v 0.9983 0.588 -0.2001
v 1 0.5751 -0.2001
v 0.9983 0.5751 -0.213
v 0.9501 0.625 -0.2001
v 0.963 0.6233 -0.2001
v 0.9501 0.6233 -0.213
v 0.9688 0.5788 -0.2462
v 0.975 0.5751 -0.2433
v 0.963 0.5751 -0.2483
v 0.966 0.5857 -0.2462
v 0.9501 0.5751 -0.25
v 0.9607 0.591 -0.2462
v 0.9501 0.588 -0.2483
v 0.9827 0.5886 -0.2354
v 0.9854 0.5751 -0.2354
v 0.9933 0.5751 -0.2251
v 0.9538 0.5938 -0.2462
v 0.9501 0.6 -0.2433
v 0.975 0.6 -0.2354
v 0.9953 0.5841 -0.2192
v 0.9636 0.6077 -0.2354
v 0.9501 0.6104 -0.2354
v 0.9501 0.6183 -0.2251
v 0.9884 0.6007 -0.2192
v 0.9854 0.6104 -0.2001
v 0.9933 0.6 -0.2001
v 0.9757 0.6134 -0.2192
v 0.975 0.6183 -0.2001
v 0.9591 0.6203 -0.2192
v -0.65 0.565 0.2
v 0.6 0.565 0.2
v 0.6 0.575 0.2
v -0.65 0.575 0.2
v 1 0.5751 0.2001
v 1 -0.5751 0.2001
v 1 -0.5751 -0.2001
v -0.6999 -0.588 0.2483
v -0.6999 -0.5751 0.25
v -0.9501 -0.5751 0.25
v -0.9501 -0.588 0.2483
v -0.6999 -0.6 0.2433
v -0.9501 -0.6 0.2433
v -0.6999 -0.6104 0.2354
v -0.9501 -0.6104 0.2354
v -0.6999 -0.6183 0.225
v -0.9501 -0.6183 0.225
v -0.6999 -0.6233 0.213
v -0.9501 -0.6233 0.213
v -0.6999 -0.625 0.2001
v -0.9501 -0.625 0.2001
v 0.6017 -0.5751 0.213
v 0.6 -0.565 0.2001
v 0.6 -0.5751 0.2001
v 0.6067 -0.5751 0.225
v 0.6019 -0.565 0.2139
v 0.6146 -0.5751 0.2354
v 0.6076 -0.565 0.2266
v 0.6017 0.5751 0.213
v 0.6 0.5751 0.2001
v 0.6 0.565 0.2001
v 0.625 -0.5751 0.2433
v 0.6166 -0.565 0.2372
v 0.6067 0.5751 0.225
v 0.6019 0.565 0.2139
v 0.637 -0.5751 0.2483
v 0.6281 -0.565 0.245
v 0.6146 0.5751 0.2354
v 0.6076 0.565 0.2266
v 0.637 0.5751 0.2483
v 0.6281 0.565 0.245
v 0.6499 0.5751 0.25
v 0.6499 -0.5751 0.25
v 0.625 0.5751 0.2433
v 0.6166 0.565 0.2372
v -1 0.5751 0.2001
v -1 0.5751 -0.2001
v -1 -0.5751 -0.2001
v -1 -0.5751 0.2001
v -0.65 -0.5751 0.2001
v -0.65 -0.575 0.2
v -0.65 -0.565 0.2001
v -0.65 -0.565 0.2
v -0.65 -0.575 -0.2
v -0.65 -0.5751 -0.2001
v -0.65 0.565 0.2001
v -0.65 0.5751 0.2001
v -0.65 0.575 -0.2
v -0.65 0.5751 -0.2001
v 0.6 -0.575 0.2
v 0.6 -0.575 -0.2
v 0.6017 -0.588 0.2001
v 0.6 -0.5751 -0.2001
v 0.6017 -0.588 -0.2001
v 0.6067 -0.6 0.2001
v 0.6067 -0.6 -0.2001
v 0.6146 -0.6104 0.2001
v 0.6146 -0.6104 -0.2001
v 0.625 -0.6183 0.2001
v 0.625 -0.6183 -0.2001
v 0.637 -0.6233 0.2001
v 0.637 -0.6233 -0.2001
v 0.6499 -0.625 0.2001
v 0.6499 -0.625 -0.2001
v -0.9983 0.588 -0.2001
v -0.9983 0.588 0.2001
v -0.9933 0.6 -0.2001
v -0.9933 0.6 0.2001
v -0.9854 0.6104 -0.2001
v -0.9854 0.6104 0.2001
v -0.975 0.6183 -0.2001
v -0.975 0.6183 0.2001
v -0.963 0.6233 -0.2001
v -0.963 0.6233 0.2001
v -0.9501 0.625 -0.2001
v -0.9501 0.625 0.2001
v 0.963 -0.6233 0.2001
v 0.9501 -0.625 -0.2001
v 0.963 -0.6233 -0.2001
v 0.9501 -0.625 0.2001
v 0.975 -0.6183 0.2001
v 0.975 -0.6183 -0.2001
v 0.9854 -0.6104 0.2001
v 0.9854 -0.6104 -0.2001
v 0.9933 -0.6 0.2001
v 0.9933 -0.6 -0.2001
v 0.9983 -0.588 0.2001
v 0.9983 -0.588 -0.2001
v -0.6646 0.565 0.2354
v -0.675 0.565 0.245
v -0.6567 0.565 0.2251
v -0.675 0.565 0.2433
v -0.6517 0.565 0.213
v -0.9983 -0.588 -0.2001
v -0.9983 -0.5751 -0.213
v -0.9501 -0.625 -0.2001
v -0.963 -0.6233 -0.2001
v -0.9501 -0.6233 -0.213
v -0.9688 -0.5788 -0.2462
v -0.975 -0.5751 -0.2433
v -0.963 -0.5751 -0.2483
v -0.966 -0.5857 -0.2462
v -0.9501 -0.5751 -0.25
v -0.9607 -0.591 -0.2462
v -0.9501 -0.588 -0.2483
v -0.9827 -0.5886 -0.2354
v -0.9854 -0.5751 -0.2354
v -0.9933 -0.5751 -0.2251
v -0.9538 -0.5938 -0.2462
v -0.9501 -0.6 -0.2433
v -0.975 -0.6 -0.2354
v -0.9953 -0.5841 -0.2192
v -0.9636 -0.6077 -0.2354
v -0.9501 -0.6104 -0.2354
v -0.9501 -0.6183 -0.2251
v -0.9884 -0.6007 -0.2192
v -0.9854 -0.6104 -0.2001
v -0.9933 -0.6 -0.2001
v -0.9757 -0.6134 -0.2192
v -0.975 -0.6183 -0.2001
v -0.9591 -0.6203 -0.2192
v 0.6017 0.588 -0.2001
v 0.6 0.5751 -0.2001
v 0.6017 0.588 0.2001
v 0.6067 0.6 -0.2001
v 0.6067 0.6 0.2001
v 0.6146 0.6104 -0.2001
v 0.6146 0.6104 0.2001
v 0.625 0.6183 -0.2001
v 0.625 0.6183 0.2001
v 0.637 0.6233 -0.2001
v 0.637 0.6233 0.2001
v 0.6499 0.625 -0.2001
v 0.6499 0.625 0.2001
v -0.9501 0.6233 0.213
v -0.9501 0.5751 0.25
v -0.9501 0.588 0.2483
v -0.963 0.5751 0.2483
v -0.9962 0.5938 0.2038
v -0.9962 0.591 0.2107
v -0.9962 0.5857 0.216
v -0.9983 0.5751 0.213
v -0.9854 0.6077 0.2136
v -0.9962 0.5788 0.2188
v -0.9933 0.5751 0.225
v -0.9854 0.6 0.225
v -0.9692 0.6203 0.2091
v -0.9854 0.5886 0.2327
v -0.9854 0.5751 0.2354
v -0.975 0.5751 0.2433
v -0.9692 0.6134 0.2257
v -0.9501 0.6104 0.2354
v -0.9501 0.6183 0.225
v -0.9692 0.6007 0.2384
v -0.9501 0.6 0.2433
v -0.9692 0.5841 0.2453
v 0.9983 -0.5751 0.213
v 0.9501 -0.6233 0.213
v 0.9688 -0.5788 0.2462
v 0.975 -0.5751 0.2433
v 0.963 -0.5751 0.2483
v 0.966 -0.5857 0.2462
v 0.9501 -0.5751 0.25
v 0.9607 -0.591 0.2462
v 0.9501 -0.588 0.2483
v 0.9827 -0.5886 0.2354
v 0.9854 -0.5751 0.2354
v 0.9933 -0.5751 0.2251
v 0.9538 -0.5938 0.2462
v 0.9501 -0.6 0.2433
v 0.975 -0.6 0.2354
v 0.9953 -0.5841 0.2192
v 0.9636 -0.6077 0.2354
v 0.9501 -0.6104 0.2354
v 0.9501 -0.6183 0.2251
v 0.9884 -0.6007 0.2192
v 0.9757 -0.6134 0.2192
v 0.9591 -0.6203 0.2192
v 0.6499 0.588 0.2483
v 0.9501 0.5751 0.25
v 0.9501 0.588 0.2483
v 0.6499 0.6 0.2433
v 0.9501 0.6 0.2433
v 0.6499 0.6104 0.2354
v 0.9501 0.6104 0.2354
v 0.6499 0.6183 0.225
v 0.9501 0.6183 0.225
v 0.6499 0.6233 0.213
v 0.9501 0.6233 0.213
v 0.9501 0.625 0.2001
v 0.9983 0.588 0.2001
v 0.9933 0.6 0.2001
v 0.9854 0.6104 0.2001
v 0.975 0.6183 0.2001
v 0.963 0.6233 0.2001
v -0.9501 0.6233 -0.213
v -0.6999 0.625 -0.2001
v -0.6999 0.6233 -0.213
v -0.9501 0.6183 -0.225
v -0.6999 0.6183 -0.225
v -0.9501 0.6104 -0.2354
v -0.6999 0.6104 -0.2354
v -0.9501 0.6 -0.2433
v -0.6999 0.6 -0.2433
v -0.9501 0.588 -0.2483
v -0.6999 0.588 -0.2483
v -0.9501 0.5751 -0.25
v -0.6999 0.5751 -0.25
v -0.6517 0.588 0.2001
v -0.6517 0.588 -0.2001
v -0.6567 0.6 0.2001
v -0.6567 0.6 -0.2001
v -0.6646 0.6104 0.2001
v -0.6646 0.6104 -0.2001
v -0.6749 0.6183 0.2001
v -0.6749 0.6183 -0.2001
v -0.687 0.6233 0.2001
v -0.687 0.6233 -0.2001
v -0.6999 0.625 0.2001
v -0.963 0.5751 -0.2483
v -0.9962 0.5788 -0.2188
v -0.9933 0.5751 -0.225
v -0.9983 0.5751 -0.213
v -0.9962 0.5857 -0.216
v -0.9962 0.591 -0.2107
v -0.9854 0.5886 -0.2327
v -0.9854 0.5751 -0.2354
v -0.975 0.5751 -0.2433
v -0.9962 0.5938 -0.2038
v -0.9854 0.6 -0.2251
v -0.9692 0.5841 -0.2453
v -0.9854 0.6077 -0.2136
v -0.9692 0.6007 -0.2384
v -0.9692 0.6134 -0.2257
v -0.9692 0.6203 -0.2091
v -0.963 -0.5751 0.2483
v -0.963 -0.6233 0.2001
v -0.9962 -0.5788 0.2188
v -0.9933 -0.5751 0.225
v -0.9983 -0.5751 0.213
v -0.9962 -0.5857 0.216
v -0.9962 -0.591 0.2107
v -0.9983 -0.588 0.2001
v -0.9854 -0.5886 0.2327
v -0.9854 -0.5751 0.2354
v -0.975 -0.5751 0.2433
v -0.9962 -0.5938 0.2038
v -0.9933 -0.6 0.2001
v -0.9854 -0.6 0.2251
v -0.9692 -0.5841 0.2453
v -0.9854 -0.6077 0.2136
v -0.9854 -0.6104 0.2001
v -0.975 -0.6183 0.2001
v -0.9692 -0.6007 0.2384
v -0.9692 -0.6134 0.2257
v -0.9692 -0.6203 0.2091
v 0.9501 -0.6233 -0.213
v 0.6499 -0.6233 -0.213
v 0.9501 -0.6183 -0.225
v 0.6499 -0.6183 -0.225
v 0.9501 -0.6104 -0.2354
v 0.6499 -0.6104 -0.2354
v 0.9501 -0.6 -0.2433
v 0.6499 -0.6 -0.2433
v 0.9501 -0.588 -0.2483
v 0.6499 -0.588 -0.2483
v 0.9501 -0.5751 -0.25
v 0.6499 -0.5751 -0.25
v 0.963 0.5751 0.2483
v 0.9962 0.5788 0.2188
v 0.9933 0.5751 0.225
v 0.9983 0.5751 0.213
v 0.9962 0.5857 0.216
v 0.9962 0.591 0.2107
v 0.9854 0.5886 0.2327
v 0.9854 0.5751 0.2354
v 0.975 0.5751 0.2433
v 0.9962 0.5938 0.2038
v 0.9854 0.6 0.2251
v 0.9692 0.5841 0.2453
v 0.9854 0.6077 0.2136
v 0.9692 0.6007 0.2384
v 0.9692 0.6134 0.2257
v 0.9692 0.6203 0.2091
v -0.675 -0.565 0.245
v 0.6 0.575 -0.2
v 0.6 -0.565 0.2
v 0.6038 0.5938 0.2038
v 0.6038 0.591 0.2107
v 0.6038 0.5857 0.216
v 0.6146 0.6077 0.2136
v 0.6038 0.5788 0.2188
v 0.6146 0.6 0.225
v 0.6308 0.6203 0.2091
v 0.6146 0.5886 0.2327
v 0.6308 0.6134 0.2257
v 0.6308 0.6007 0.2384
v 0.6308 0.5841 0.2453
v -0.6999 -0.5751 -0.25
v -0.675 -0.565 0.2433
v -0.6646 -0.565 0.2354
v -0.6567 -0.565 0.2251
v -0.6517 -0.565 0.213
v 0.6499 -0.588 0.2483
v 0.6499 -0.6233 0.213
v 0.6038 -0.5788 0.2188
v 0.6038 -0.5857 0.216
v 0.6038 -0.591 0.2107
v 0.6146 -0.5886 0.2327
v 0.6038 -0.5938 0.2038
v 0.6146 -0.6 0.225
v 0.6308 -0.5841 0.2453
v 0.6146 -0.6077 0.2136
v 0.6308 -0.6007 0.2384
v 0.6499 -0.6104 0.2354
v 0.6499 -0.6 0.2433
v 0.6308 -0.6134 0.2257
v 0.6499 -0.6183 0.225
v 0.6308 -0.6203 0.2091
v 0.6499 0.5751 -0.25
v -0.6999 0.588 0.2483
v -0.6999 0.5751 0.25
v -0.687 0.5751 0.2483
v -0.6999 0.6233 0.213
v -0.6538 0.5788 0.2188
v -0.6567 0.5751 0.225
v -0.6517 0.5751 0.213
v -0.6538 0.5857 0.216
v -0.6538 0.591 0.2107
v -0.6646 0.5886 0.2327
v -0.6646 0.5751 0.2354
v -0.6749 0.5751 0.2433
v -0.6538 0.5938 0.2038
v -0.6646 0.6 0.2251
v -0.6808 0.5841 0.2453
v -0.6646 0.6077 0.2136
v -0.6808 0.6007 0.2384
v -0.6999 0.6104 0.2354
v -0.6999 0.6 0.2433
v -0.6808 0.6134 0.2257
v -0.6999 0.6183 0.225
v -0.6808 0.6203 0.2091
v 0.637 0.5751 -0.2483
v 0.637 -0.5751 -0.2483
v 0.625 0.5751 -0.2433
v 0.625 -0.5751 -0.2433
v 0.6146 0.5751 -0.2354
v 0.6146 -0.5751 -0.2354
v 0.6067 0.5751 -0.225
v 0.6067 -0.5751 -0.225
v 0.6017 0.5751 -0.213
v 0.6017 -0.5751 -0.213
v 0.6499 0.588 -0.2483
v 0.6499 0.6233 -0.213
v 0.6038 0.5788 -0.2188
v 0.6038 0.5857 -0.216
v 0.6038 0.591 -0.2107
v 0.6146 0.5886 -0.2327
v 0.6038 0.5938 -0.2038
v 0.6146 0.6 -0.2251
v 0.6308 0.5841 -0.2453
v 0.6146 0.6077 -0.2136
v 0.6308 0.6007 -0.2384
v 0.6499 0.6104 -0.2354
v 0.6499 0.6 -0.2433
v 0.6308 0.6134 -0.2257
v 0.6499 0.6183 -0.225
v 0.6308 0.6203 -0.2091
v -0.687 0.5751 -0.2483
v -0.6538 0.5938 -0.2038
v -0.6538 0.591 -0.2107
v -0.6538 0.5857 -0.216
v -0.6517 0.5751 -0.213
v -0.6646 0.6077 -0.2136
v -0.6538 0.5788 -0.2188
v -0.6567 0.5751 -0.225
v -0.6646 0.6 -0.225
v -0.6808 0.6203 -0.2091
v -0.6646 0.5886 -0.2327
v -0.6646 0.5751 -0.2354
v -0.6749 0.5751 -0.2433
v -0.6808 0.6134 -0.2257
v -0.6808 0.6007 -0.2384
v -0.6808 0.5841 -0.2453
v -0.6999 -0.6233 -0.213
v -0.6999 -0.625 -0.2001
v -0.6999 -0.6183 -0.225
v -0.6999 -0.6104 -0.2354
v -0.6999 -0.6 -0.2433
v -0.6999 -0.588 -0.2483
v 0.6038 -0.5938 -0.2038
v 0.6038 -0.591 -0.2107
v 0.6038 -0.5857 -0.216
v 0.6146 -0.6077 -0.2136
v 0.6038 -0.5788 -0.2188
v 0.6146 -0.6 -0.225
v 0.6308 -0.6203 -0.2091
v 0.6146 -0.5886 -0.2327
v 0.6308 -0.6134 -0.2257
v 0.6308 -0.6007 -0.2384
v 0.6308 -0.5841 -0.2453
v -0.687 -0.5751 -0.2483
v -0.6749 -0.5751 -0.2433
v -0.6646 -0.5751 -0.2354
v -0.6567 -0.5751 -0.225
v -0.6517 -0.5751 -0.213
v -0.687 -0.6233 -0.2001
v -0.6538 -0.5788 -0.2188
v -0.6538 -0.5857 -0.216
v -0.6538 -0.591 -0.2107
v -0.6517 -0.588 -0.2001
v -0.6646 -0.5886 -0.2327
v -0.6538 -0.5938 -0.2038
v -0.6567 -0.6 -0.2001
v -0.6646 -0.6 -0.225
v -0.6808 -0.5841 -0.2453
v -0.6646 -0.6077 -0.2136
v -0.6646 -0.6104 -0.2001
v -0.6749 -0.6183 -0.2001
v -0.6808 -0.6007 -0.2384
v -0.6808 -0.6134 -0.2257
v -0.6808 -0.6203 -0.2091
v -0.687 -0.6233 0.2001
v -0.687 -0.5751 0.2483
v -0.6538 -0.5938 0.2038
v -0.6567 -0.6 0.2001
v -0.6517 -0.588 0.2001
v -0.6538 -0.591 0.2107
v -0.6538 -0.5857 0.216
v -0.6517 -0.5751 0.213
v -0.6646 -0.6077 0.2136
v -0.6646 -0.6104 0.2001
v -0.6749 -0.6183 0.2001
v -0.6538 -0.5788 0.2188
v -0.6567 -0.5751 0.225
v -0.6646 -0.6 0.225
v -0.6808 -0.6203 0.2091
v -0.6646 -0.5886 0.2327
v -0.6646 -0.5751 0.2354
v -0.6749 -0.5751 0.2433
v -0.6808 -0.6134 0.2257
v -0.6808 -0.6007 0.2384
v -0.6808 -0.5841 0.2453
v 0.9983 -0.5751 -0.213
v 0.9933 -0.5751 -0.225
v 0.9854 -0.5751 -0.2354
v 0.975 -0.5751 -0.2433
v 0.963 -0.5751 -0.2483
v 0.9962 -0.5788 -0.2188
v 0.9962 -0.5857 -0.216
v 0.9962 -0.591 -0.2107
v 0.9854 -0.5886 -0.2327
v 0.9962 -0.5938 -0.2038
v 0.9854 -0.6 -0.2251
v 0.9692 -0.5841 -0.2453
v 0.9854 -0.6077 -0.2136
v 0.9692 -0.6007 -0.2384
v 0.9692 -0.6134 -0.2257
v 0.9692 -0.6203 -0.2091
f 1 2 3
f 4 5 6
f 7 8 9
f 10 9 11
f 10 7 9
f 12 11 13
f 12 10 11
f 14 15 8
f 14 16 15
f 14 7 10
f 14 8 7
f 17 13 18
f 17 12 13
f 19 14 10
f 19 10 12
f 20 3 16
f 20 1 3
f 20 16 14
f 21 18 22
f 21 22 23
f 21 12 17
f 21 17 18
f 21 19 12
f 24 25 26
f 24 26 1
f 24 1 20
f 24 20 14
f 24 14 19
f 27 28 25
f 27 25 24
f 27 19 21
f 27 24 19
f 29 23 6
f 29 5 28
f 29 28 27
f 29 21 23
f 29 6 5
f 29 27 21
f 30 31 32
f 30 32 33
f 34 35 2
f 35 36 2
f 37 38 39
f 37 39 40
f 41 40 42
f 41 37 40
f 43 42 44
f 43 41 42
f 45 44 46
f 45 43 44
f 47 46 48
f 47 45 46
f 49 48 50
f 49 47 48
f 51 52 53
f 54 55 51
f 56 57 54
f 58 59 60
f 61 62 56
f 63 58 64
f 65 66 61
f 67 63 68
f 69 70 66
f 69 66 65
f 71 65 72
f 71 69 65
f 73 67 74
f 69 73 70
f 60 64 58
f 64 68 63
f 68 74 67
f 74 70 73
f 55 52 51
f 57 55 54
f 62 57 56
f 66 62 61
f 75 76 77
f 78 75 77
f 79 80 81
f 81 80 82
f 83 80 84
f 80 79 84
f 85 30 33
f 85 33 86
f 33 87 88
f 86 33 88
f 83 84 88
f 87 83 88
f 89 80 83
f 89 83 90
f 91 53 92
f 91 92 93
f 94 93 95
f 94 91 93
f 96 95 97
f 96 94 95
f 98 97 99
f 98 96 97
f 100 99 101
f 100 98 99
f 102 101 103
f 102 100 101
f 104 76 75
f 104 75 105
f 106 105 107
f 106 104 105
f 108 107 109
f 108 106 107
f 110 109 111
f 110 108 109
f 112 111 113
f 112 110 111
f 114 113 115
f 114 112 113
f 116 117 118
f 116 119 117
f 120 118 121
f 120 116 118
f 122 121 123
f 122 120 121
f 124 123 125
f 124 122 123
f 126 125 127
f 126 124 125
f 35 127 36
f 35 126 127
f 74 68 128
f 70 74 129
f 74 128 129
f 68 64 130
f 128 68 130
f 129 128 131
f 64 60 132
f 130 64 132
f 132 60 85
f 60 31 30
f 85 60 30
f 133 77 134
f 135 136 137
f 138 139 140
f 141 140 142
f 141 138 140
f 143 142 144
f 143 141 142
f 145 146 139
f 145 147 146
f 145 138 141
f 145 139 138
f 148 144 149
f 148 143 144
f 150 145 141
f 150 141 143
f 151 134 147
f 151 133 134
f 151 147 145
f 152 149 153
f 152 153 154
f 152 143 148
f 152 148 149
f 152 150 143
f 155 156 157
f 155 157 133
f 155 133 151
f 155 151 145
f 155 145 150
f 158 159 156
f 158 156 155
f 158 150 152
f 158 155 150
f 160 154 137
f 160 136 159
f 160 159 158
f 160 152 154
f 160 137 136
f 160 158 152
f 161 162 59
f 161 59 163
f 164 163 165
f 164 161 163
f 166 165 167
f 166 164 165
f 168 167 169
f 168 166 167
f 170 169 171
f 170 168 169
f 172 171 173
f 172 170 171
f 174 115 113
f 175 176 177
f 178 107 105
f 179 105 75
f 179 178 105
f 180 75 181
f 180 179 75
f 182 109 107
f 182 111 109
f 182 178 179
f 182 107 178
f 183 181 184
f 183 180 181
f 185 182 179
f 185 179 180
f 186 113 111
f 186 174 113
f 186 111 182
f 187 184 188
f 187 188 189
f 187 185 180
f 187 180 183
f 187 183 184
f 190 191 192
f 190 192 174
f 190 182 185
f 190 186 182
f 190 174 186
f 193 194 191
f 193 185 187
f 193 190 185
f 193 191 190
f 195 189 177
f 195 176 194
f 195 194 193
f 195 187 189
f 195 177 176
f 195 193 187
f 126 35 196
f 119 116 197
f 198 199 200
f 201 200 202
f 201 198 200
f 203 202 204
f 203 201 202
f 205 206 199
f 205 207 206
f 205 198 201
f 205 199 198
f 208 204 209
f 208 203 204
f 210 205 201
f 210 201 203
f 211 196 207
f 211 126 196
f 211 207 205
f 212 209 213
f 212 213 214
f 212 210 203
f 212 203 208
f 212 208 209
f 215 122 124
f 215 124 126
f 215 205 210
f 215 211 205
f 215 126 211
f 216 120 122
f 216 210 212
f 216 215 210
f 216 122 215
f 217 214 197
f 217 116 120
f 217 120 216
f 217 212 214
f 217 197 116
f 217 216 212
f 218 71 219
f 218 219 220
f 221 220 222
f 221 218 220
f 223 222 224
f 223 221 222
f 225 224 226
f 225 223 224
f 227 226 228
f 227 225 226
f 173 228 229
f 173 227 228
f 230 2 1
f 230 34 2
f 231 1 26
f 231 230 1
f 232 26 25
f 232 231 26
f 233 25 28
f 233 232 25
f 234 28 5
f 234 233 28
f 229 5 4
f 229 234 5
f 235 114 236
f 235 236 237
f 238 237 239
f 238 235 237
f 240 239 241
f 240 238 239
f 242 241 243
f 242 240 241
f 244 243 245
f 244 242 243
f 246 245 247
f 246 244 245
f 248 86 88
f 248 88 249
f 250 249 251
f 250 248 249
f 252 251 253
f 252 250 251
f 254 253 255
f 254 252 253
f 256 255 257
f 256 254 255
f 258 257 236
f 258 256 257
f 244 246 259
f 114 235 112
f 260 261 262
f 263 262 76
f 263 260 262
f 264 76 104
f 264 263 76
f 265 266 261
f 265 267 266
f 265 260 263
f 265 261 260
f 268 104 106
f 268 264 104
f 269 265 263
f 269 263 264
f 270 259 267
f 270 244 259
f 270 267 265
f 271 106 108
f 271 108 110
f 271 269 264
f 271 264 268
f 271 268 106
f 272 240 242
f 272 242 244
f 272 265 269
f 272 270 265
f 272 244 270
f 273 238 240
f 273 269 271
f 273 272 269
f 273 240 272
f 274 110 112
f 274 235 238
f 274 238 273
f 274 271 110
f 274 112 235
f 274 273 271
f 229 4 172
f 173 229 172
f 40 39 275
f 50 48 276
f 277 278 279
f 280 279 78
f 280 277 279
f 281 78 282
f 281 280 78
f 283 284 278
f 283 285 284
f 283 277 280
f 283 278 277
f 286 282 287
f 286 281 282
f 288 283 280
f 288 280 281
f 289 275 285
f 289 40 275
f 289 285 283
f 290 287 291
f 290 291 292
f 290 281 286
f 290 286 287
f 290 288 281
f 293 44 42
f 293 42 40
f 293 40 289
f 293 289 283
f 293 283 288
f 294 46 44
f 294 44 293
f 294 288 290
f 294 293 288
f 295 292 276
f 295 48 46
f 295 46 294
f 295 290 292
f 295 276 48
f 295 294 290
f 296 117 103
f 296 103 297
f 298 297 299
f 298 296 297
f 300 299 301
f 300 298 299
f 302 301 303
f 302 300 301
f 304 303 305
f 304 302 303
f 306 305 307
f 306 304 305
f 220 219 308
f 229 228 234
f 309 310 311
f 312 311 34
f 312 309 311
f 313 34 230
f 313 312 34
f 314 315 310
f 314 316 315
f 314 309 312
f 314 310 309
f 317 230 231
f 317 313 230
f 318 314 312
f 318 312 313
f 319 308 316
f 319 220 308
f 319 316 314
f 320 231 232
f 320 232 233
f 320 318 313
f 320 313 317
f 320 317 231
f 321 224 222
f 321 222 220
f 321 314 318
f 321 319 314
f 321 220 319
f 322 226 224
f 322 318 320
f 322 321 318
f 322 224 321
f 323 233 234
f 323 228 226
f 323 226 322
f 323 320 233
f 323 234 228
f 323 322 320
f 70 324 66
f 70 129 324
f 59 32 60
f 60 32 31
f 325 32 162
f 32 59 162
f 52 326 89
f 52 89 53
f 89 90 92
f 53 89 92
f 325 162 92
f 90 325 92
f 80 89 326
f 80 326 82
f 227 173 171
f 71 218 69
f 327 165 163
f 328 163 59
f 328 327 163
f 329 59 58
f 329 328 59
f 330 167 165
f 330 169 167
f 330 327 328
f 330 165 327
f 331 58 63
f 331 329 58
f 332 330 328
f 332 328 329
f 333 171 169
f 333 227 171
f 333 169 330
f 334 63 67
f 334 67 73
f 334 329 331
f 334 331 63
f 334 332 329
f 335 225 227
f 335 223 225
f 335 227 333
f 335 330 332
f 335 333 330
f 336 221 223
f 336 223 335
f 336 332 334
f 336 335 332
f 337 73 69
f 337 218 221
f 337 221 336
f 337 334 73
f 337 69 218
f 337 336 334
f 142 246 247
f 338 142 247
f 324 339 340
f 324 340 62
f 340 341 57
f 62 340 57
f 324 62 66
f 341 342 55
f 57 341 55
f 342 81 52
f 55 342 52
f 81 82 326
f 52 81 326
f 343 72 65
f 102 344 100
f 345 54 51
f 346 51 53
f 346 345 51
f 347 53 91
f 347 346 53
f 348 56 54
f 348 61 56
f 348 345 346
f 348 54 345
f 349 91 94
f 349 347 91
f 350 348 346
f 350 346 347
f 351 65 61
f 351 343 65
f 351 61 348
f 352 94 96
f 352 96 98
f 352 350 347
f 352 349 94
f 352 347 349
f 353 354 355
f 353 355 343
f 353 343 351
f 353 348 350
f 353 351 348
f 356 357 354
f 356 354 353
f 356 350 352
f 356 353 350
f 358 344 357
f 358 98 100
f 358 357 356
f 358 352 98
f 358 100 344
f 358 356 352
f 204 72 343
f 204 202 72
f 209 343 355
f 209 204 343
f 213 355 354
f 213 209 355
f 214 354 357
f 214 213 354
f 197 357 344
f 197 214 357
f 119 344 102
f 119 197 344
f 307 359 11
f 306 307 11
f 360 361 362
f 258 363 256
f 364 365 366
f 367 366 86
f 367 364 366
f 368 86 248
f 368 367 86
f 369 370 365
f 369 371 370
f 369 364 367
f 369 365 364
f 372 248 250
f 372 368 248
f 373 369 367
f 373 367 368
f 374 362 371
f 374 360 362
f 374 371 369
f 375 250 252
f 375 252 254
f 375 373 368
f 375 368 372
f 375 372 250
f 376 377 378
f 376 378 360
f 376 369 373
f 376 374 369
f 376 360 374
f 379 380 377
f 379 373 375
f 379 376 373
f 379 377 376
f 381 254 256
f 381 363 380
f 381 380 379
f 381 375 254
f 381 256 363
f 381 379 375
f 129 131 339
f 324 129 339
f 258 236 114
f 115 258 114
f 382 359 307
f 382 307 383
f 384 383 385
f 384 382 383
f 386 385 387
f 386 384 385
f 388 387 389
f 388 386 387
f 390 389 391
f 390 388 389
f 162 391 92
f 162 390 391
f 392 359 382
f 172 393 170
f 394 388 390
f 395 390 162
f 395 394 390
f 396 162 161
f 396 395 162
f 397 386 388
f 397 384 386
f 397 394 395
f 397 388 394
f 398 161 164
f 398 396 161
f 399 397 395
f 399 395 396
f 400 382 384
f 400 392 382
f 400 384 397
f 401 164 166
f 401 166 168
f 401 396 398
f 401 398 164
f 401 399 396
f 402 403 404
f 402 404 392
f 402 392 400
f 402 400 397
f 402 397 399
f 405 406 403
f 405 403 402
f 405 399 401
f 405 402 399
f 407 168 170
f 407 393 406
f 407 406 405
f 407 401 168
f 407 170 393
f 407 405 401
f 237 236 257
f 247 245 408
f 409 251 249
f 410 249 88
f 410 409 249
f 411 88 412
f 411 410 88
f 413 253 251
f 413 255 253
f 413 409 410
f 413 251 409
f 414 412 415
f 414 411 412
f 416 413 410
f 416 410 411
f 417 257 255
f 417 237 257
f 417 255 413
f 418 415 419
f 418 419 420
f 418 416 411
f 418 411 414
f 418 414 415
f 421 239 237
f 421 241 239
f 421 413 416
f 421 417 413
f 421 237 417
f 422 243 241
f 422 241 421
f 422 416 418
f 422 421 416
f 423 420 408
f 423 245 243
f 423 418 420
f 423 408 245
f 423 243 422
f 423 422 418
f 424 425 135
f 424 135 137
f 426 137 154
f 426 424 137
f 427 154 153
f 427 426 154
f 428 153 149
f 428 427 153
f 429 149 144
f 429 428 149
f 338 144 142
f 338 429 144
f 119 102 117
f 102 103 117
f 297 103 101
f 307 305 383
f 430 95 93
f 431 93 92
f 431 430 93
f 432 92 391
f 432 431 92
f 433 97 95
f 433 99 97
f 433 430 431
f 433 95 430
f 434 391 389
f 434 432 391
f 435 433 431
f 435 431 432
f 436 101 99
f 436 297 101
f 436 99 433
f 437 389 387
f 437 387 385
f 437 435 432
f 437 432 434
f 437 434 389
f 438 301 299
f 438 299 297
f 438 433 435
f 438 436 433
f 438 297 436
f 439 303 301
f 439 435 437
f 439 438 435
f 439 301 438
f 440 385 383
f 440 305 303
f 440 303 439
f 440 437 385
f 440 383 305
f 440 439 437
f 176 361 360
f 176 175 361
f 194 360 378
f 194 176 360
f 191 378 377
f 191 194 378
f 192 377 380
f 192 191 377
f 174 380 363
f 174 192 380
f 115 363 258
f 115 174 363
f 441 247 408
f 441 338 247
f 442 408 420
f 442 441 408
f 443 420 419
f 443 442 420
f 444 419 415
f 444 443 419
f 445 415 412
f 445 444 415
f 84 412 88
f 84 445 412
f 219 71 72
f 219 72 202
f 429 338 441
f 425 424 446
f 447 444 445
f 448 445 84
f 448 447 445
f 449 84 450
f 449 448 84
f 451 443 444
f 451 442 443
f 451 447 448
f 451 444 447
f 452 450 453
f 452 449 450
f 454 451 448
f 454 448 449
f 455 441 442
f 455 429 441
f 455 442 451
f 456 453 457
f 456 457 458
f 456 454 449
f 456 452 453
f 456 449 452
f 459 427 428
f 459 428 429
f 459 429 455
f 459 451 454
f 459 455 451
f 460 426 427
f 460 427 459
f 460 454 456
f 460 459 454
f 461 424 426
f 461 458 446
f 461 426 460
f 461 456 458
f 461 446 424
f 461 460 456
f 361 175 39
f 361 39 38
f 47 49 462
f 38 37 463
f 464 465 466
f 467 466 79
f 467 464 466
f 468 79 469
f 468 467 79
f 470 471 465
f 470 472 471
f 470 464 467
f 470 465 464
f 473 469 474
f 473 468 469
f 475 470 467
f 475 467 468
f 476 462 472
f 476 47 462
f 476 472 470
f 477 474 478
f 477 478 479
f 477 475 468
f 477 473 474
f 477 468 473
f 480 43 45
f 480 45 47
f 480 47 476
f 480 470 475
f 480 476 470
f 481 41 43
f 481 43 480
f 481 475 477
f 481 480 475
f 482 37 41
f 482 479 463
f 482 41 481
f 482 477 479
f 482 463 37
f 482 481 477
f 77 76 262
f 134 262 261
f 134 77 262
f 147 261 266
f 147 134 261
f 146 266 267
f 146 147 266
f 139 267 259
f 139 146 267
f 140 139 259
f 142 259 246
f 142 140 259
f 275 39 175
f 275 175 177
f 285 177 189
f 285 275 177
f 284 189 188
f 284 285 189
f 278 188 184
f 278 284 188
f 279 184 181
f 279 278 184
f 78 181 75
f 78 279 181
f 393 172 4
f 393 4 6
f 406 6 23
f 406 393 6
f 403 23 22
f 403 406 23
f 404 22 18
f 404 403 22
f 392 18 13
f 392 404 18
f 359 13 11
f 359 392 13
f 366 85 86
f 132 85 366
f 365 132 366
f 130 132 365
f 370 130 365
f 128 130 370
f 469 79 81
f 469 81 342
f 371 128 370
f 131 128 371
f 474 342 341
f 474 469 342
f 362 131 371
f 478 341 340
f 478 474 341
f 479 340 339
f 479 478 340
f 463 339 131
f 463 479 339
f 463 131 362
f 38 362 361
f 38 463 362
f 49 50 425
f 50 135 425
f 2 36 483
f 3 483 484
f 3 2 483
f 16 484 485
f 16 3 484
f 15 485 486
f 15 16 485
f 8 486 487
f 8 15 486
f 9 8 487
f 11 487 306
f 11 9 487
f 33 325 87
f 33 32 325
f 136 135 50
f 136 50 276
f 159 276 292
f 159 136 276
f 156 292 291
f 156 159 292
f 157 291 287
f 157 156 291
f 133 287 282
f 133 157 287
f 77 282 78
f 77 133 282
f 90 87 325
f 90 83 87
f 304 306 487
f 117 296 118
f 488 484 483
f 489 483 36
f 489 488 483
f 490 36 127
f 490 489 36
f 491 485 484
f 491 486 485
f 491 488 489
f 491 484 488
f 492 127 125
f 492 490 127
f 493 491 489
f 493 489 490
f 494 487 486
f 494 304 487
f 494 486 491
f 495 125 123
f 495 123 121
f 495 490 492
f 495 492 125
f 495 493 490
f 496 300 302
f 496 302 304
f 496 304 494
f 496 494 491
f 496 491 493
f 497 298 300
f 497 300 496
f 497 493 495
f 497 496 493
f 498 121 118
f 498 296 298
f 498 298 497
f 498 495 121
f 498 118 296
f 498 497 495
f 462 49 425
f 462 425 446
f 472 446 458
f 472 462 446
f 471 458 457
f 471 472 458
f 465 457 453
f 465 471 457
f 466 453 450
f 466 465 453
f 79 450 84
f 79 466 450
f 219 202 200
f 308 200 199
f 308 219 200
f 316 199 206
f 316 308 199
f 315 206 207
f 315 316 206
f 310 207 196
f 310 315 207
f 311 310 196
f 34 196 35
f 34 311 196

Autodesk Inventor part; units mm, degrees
ref_plane "YZ Plane" through (0, 0, 0) normal (1, 0, 0) x (0, 1, 0)
ref_plane "XZ Plane" through (0, 0, 0) normal (0, 1, 0) x (-1, 0, 0)
ref_plane "XY Plane" through (0, 0, 0) normal (0, 0, 1) x (1, 0, 0)
sketch "Sketch1" plane through (0, 0, 0) normal (0, 0, 1) x (1, 0, 0)
  line L0 (1, 0.625) -> (-1, 0.625)
  line L1 (-1, 0.625) -> (-1, -0.625)
  line L2 (-1, -0.625) -> (1, -0.625)
  line L3 (1, -0.625) -> (1, 0.625)
  line L4 (1, 0.625) -> (-1, -0.625) construction
  line L5 (-1, 0.625) -> (1, -0.625) construction
  point P0 (0, 0)
  dimension "d0" = 2
  dimension "d1" = 1.25
sketch "Sketch1 outline for Extrusion1" plane through (0, 0, 0) normal (0, 0, 1) x (1, 0, 0)
  line L0 (1, -0.625) -> (1, 0.625)
  line L1 (-1, -0.625) -> (1, -0.625)
  line L2 (-1, 0.625) -> (-1, -0.625)
  line L3 (1, 0.625) -> (-1, 0.625)
extrude "Extrusion1" add sketch "Sketch1 outline for Extrusion1" along normal mid plane 0.5
sketch "Sketch2" plane through (0, 0, 0.25) normal (0, 0, 1) x (-1, 0, 0)
  line L0 (0.65, 0.624281) -> (0.65, -0.625)
  line L1 (-1, 0.625) -> (-0.6, 0.625)
  line L2 (-0.6, 0.625) -> (-0.6, -0.625)
  line L3 (-0.6, -0.625) -> (-1, -0.625)
  line L4 (-1, -0.625) -> (-1, 0.625)
  line L5 (-0.6, 0.625) -> (0.65, 0.625)
  line L6 (0.65, 0.625) -> (0.65, -0.625)
  line L7 (0.65, -0.625) -> (-0.6, -0.625)
  line L8 (-0.6, -0.625) -> (-0.6, 0.625)
  line L9 (1, -0.625) -> (1, 0.625)
  line L10 (-1, -0.625) -> (1, -0.625)
  line L11 (1, -0.625) -> (1, 0.625)
  line L12 (1, 0.625) -> (-1, 0.625)
  line L13 (-1, 0.625) -> (-1, -0.625)
  point P0 (0, 0)
  point P1 (0, -0.625)
  dimension "d5" = 0.4
  dimension "d11" = 0.35
sketch "Sketch2 outline for Extrusion2" plane through (0, 0, 0.25) normal (0, 0, 1) x (-1, 0, 0)
  line L0 (-0.6, -0.625) -> (0.65, -0.625)
  line L1 (-0.6, 0.625) -> (-0.6, -0.625)
  line L2 (0.65, 0.625) -> (-0.6, 0.625)
  line L3 (0.65, -0.625) -> (0.65, 0.625)
extrude "Extrusion2" cut sketch "Sketch2 outline for Extrusion2" against normal blind 0.05
mirror "Mirror1" about plane through (0, 0, 0) normal (0, 0, 1) of "Extrusion2"
sketch "Sketch3" plane through (1, -0.625, -0.25) normal (0, -1, 0) x (1, 0, 0)
  line L0 (-1.65, 0.45) -> (-0.4, 0.45)
  line L1 (-0.4, 0.45) -> (-0.4, 0.05)
  line L2 (-0.4, 0.05) -> (-1.65, 0.05)
  line L3 (-1.65, 0.05) -> (-1.65, 0.45)
  point P0 (-1, 0.25)
sketch "Sketch3 outline for Extrusion3" plane through (1, -0.625, -0.25) normal (0, -1, 0) x (1, 0, 0)
  line L0 (-1.65, 0.45) -> (-0.4, 0.45)
  line L1 (-0.4, 0.45) -> (-0.4, 0.05)
  line L2 (-0.4, 0.05) -> (-1.65, 0.05)
  line L3 (-1.65, 0.05) -> (-1.65, 0.45)
extrude "Extrusion3" cut sketch "Sketch3 outline for Extrusion3" against normal blind 0.05
mirror "Mirror2" about plane through (0, 0, 0) normal (0, 1, 0) of "Extrusion3"
fillet "Fillet1" radius 0.05 24 edges at (0.8, 0.625, 0.25) (1, 0.625, 0) (0.8, 0.625, -0.25) (0.8, -0.625, -0.25) (1, -0.625, 0) (0.8, -0.625, 0.25) (-0.825, -0.625, 0.25) (-1, -0.625, 0) (-0.825, -0.625, -0.25) (1, 0, -0.25) (1, 0, 0.25) (-0.825, 0.625, 0.25) (-1, 0, 0.25) (-0.825, 0.625, -0.25) (-1, 0.625, 0) (-1, 0, -0.25) (-0.65, 0.625, 0) (-0.65, 0, 0.25) (-0.65, -0.625, 0) (-0.65, 0, -0.25) (0.6, 0.625, 0) (0.6, 0, -0.25) (0.6, -0.625, 0) (0.6, 0, 0.25)
sketch "Sketch4" plane through (0, 0, 0.2) normal (0, 0, 1) x (1, 0, 0)
  line L0 (0.6, 0.575) -> (-0.65, 0.575) projected
  line L1 (-0.65, -0.575) -> (-0.65, 0.575) projected
  line L2 (-0.65, -0.575) -> (0.6, -0.575) projected
  line L3 (0.6, 0.575) -> (0.6, -0.575) projected
  line L4 (-0.65, 0.575) -> (-0.7, 0.575) projected
  line L5 (-0.7, 0.575) -> (-0.7, -0.575) projected
  line L6 (-0.7, -0.575) -> (-0.65, -0.575) projected
  line L7 (-0.65, -0.575) -> (-0.65, 0.575) projected
  line L8 (0.6, -0.575) -> (0.65, -0.575) projected
  line L9 (0.65, -0.575) -> (0.65, 0.575) projected
  line L10 (0.65, 0.575) -> (0.6, 0.575) projected
  line L11 (0.6, 0.575) -> (0.6, -0.575) projected
  line L12 (-0.7, -0.575) -> (0.65, -0.575)
  line L13 (0.65, -0.575) -> (0.65, 0.575)
  line L14 (0.65, 0.575) -> (-0.7, 0.575)
  line L15 (-0.7, 0.575) -> (-0.7, -0.575)
  line L16 (-0.675, -0.565) -> (0.64, -0.565)
  line L17 (0.64, -0.565) -> (0.64, 0.565)
  line L18 (0.64, 0.565) -> (-0.675, 0.565)
  line L19 (-0.675, 0.565) -> (-0.675, -0.565)
  point P0 (0, 0)
  dimension "d12" = 0.01
  dimension "d13" = 0.01
  dimension "d14" = 0.01
  dimension "d15" = 0.025
sketch "Sketch4 outline for Extrusion4" plane through (0, 0, 0.2) normal (0, 0, 1) x (1, 0, 0)
  line L0 (-0.675, 0.565) -> (-0.675, -0.565)
  line L1 (0.64, 0.565) -> (-0.675, 0.565)
  line L2 (0.64, -0.565) -> (0.64, 0.565)
  line L3 (-0.675, -0.565) -> (0.64, -0.565)
extrude "Extrusion4" add sketch "Sketch4 outline for Extrusion4" along normal blind 0.045
equation "\"d13\" = d12"
equation "\"d14\" = d13"
properties part number "0805 Resistor"
